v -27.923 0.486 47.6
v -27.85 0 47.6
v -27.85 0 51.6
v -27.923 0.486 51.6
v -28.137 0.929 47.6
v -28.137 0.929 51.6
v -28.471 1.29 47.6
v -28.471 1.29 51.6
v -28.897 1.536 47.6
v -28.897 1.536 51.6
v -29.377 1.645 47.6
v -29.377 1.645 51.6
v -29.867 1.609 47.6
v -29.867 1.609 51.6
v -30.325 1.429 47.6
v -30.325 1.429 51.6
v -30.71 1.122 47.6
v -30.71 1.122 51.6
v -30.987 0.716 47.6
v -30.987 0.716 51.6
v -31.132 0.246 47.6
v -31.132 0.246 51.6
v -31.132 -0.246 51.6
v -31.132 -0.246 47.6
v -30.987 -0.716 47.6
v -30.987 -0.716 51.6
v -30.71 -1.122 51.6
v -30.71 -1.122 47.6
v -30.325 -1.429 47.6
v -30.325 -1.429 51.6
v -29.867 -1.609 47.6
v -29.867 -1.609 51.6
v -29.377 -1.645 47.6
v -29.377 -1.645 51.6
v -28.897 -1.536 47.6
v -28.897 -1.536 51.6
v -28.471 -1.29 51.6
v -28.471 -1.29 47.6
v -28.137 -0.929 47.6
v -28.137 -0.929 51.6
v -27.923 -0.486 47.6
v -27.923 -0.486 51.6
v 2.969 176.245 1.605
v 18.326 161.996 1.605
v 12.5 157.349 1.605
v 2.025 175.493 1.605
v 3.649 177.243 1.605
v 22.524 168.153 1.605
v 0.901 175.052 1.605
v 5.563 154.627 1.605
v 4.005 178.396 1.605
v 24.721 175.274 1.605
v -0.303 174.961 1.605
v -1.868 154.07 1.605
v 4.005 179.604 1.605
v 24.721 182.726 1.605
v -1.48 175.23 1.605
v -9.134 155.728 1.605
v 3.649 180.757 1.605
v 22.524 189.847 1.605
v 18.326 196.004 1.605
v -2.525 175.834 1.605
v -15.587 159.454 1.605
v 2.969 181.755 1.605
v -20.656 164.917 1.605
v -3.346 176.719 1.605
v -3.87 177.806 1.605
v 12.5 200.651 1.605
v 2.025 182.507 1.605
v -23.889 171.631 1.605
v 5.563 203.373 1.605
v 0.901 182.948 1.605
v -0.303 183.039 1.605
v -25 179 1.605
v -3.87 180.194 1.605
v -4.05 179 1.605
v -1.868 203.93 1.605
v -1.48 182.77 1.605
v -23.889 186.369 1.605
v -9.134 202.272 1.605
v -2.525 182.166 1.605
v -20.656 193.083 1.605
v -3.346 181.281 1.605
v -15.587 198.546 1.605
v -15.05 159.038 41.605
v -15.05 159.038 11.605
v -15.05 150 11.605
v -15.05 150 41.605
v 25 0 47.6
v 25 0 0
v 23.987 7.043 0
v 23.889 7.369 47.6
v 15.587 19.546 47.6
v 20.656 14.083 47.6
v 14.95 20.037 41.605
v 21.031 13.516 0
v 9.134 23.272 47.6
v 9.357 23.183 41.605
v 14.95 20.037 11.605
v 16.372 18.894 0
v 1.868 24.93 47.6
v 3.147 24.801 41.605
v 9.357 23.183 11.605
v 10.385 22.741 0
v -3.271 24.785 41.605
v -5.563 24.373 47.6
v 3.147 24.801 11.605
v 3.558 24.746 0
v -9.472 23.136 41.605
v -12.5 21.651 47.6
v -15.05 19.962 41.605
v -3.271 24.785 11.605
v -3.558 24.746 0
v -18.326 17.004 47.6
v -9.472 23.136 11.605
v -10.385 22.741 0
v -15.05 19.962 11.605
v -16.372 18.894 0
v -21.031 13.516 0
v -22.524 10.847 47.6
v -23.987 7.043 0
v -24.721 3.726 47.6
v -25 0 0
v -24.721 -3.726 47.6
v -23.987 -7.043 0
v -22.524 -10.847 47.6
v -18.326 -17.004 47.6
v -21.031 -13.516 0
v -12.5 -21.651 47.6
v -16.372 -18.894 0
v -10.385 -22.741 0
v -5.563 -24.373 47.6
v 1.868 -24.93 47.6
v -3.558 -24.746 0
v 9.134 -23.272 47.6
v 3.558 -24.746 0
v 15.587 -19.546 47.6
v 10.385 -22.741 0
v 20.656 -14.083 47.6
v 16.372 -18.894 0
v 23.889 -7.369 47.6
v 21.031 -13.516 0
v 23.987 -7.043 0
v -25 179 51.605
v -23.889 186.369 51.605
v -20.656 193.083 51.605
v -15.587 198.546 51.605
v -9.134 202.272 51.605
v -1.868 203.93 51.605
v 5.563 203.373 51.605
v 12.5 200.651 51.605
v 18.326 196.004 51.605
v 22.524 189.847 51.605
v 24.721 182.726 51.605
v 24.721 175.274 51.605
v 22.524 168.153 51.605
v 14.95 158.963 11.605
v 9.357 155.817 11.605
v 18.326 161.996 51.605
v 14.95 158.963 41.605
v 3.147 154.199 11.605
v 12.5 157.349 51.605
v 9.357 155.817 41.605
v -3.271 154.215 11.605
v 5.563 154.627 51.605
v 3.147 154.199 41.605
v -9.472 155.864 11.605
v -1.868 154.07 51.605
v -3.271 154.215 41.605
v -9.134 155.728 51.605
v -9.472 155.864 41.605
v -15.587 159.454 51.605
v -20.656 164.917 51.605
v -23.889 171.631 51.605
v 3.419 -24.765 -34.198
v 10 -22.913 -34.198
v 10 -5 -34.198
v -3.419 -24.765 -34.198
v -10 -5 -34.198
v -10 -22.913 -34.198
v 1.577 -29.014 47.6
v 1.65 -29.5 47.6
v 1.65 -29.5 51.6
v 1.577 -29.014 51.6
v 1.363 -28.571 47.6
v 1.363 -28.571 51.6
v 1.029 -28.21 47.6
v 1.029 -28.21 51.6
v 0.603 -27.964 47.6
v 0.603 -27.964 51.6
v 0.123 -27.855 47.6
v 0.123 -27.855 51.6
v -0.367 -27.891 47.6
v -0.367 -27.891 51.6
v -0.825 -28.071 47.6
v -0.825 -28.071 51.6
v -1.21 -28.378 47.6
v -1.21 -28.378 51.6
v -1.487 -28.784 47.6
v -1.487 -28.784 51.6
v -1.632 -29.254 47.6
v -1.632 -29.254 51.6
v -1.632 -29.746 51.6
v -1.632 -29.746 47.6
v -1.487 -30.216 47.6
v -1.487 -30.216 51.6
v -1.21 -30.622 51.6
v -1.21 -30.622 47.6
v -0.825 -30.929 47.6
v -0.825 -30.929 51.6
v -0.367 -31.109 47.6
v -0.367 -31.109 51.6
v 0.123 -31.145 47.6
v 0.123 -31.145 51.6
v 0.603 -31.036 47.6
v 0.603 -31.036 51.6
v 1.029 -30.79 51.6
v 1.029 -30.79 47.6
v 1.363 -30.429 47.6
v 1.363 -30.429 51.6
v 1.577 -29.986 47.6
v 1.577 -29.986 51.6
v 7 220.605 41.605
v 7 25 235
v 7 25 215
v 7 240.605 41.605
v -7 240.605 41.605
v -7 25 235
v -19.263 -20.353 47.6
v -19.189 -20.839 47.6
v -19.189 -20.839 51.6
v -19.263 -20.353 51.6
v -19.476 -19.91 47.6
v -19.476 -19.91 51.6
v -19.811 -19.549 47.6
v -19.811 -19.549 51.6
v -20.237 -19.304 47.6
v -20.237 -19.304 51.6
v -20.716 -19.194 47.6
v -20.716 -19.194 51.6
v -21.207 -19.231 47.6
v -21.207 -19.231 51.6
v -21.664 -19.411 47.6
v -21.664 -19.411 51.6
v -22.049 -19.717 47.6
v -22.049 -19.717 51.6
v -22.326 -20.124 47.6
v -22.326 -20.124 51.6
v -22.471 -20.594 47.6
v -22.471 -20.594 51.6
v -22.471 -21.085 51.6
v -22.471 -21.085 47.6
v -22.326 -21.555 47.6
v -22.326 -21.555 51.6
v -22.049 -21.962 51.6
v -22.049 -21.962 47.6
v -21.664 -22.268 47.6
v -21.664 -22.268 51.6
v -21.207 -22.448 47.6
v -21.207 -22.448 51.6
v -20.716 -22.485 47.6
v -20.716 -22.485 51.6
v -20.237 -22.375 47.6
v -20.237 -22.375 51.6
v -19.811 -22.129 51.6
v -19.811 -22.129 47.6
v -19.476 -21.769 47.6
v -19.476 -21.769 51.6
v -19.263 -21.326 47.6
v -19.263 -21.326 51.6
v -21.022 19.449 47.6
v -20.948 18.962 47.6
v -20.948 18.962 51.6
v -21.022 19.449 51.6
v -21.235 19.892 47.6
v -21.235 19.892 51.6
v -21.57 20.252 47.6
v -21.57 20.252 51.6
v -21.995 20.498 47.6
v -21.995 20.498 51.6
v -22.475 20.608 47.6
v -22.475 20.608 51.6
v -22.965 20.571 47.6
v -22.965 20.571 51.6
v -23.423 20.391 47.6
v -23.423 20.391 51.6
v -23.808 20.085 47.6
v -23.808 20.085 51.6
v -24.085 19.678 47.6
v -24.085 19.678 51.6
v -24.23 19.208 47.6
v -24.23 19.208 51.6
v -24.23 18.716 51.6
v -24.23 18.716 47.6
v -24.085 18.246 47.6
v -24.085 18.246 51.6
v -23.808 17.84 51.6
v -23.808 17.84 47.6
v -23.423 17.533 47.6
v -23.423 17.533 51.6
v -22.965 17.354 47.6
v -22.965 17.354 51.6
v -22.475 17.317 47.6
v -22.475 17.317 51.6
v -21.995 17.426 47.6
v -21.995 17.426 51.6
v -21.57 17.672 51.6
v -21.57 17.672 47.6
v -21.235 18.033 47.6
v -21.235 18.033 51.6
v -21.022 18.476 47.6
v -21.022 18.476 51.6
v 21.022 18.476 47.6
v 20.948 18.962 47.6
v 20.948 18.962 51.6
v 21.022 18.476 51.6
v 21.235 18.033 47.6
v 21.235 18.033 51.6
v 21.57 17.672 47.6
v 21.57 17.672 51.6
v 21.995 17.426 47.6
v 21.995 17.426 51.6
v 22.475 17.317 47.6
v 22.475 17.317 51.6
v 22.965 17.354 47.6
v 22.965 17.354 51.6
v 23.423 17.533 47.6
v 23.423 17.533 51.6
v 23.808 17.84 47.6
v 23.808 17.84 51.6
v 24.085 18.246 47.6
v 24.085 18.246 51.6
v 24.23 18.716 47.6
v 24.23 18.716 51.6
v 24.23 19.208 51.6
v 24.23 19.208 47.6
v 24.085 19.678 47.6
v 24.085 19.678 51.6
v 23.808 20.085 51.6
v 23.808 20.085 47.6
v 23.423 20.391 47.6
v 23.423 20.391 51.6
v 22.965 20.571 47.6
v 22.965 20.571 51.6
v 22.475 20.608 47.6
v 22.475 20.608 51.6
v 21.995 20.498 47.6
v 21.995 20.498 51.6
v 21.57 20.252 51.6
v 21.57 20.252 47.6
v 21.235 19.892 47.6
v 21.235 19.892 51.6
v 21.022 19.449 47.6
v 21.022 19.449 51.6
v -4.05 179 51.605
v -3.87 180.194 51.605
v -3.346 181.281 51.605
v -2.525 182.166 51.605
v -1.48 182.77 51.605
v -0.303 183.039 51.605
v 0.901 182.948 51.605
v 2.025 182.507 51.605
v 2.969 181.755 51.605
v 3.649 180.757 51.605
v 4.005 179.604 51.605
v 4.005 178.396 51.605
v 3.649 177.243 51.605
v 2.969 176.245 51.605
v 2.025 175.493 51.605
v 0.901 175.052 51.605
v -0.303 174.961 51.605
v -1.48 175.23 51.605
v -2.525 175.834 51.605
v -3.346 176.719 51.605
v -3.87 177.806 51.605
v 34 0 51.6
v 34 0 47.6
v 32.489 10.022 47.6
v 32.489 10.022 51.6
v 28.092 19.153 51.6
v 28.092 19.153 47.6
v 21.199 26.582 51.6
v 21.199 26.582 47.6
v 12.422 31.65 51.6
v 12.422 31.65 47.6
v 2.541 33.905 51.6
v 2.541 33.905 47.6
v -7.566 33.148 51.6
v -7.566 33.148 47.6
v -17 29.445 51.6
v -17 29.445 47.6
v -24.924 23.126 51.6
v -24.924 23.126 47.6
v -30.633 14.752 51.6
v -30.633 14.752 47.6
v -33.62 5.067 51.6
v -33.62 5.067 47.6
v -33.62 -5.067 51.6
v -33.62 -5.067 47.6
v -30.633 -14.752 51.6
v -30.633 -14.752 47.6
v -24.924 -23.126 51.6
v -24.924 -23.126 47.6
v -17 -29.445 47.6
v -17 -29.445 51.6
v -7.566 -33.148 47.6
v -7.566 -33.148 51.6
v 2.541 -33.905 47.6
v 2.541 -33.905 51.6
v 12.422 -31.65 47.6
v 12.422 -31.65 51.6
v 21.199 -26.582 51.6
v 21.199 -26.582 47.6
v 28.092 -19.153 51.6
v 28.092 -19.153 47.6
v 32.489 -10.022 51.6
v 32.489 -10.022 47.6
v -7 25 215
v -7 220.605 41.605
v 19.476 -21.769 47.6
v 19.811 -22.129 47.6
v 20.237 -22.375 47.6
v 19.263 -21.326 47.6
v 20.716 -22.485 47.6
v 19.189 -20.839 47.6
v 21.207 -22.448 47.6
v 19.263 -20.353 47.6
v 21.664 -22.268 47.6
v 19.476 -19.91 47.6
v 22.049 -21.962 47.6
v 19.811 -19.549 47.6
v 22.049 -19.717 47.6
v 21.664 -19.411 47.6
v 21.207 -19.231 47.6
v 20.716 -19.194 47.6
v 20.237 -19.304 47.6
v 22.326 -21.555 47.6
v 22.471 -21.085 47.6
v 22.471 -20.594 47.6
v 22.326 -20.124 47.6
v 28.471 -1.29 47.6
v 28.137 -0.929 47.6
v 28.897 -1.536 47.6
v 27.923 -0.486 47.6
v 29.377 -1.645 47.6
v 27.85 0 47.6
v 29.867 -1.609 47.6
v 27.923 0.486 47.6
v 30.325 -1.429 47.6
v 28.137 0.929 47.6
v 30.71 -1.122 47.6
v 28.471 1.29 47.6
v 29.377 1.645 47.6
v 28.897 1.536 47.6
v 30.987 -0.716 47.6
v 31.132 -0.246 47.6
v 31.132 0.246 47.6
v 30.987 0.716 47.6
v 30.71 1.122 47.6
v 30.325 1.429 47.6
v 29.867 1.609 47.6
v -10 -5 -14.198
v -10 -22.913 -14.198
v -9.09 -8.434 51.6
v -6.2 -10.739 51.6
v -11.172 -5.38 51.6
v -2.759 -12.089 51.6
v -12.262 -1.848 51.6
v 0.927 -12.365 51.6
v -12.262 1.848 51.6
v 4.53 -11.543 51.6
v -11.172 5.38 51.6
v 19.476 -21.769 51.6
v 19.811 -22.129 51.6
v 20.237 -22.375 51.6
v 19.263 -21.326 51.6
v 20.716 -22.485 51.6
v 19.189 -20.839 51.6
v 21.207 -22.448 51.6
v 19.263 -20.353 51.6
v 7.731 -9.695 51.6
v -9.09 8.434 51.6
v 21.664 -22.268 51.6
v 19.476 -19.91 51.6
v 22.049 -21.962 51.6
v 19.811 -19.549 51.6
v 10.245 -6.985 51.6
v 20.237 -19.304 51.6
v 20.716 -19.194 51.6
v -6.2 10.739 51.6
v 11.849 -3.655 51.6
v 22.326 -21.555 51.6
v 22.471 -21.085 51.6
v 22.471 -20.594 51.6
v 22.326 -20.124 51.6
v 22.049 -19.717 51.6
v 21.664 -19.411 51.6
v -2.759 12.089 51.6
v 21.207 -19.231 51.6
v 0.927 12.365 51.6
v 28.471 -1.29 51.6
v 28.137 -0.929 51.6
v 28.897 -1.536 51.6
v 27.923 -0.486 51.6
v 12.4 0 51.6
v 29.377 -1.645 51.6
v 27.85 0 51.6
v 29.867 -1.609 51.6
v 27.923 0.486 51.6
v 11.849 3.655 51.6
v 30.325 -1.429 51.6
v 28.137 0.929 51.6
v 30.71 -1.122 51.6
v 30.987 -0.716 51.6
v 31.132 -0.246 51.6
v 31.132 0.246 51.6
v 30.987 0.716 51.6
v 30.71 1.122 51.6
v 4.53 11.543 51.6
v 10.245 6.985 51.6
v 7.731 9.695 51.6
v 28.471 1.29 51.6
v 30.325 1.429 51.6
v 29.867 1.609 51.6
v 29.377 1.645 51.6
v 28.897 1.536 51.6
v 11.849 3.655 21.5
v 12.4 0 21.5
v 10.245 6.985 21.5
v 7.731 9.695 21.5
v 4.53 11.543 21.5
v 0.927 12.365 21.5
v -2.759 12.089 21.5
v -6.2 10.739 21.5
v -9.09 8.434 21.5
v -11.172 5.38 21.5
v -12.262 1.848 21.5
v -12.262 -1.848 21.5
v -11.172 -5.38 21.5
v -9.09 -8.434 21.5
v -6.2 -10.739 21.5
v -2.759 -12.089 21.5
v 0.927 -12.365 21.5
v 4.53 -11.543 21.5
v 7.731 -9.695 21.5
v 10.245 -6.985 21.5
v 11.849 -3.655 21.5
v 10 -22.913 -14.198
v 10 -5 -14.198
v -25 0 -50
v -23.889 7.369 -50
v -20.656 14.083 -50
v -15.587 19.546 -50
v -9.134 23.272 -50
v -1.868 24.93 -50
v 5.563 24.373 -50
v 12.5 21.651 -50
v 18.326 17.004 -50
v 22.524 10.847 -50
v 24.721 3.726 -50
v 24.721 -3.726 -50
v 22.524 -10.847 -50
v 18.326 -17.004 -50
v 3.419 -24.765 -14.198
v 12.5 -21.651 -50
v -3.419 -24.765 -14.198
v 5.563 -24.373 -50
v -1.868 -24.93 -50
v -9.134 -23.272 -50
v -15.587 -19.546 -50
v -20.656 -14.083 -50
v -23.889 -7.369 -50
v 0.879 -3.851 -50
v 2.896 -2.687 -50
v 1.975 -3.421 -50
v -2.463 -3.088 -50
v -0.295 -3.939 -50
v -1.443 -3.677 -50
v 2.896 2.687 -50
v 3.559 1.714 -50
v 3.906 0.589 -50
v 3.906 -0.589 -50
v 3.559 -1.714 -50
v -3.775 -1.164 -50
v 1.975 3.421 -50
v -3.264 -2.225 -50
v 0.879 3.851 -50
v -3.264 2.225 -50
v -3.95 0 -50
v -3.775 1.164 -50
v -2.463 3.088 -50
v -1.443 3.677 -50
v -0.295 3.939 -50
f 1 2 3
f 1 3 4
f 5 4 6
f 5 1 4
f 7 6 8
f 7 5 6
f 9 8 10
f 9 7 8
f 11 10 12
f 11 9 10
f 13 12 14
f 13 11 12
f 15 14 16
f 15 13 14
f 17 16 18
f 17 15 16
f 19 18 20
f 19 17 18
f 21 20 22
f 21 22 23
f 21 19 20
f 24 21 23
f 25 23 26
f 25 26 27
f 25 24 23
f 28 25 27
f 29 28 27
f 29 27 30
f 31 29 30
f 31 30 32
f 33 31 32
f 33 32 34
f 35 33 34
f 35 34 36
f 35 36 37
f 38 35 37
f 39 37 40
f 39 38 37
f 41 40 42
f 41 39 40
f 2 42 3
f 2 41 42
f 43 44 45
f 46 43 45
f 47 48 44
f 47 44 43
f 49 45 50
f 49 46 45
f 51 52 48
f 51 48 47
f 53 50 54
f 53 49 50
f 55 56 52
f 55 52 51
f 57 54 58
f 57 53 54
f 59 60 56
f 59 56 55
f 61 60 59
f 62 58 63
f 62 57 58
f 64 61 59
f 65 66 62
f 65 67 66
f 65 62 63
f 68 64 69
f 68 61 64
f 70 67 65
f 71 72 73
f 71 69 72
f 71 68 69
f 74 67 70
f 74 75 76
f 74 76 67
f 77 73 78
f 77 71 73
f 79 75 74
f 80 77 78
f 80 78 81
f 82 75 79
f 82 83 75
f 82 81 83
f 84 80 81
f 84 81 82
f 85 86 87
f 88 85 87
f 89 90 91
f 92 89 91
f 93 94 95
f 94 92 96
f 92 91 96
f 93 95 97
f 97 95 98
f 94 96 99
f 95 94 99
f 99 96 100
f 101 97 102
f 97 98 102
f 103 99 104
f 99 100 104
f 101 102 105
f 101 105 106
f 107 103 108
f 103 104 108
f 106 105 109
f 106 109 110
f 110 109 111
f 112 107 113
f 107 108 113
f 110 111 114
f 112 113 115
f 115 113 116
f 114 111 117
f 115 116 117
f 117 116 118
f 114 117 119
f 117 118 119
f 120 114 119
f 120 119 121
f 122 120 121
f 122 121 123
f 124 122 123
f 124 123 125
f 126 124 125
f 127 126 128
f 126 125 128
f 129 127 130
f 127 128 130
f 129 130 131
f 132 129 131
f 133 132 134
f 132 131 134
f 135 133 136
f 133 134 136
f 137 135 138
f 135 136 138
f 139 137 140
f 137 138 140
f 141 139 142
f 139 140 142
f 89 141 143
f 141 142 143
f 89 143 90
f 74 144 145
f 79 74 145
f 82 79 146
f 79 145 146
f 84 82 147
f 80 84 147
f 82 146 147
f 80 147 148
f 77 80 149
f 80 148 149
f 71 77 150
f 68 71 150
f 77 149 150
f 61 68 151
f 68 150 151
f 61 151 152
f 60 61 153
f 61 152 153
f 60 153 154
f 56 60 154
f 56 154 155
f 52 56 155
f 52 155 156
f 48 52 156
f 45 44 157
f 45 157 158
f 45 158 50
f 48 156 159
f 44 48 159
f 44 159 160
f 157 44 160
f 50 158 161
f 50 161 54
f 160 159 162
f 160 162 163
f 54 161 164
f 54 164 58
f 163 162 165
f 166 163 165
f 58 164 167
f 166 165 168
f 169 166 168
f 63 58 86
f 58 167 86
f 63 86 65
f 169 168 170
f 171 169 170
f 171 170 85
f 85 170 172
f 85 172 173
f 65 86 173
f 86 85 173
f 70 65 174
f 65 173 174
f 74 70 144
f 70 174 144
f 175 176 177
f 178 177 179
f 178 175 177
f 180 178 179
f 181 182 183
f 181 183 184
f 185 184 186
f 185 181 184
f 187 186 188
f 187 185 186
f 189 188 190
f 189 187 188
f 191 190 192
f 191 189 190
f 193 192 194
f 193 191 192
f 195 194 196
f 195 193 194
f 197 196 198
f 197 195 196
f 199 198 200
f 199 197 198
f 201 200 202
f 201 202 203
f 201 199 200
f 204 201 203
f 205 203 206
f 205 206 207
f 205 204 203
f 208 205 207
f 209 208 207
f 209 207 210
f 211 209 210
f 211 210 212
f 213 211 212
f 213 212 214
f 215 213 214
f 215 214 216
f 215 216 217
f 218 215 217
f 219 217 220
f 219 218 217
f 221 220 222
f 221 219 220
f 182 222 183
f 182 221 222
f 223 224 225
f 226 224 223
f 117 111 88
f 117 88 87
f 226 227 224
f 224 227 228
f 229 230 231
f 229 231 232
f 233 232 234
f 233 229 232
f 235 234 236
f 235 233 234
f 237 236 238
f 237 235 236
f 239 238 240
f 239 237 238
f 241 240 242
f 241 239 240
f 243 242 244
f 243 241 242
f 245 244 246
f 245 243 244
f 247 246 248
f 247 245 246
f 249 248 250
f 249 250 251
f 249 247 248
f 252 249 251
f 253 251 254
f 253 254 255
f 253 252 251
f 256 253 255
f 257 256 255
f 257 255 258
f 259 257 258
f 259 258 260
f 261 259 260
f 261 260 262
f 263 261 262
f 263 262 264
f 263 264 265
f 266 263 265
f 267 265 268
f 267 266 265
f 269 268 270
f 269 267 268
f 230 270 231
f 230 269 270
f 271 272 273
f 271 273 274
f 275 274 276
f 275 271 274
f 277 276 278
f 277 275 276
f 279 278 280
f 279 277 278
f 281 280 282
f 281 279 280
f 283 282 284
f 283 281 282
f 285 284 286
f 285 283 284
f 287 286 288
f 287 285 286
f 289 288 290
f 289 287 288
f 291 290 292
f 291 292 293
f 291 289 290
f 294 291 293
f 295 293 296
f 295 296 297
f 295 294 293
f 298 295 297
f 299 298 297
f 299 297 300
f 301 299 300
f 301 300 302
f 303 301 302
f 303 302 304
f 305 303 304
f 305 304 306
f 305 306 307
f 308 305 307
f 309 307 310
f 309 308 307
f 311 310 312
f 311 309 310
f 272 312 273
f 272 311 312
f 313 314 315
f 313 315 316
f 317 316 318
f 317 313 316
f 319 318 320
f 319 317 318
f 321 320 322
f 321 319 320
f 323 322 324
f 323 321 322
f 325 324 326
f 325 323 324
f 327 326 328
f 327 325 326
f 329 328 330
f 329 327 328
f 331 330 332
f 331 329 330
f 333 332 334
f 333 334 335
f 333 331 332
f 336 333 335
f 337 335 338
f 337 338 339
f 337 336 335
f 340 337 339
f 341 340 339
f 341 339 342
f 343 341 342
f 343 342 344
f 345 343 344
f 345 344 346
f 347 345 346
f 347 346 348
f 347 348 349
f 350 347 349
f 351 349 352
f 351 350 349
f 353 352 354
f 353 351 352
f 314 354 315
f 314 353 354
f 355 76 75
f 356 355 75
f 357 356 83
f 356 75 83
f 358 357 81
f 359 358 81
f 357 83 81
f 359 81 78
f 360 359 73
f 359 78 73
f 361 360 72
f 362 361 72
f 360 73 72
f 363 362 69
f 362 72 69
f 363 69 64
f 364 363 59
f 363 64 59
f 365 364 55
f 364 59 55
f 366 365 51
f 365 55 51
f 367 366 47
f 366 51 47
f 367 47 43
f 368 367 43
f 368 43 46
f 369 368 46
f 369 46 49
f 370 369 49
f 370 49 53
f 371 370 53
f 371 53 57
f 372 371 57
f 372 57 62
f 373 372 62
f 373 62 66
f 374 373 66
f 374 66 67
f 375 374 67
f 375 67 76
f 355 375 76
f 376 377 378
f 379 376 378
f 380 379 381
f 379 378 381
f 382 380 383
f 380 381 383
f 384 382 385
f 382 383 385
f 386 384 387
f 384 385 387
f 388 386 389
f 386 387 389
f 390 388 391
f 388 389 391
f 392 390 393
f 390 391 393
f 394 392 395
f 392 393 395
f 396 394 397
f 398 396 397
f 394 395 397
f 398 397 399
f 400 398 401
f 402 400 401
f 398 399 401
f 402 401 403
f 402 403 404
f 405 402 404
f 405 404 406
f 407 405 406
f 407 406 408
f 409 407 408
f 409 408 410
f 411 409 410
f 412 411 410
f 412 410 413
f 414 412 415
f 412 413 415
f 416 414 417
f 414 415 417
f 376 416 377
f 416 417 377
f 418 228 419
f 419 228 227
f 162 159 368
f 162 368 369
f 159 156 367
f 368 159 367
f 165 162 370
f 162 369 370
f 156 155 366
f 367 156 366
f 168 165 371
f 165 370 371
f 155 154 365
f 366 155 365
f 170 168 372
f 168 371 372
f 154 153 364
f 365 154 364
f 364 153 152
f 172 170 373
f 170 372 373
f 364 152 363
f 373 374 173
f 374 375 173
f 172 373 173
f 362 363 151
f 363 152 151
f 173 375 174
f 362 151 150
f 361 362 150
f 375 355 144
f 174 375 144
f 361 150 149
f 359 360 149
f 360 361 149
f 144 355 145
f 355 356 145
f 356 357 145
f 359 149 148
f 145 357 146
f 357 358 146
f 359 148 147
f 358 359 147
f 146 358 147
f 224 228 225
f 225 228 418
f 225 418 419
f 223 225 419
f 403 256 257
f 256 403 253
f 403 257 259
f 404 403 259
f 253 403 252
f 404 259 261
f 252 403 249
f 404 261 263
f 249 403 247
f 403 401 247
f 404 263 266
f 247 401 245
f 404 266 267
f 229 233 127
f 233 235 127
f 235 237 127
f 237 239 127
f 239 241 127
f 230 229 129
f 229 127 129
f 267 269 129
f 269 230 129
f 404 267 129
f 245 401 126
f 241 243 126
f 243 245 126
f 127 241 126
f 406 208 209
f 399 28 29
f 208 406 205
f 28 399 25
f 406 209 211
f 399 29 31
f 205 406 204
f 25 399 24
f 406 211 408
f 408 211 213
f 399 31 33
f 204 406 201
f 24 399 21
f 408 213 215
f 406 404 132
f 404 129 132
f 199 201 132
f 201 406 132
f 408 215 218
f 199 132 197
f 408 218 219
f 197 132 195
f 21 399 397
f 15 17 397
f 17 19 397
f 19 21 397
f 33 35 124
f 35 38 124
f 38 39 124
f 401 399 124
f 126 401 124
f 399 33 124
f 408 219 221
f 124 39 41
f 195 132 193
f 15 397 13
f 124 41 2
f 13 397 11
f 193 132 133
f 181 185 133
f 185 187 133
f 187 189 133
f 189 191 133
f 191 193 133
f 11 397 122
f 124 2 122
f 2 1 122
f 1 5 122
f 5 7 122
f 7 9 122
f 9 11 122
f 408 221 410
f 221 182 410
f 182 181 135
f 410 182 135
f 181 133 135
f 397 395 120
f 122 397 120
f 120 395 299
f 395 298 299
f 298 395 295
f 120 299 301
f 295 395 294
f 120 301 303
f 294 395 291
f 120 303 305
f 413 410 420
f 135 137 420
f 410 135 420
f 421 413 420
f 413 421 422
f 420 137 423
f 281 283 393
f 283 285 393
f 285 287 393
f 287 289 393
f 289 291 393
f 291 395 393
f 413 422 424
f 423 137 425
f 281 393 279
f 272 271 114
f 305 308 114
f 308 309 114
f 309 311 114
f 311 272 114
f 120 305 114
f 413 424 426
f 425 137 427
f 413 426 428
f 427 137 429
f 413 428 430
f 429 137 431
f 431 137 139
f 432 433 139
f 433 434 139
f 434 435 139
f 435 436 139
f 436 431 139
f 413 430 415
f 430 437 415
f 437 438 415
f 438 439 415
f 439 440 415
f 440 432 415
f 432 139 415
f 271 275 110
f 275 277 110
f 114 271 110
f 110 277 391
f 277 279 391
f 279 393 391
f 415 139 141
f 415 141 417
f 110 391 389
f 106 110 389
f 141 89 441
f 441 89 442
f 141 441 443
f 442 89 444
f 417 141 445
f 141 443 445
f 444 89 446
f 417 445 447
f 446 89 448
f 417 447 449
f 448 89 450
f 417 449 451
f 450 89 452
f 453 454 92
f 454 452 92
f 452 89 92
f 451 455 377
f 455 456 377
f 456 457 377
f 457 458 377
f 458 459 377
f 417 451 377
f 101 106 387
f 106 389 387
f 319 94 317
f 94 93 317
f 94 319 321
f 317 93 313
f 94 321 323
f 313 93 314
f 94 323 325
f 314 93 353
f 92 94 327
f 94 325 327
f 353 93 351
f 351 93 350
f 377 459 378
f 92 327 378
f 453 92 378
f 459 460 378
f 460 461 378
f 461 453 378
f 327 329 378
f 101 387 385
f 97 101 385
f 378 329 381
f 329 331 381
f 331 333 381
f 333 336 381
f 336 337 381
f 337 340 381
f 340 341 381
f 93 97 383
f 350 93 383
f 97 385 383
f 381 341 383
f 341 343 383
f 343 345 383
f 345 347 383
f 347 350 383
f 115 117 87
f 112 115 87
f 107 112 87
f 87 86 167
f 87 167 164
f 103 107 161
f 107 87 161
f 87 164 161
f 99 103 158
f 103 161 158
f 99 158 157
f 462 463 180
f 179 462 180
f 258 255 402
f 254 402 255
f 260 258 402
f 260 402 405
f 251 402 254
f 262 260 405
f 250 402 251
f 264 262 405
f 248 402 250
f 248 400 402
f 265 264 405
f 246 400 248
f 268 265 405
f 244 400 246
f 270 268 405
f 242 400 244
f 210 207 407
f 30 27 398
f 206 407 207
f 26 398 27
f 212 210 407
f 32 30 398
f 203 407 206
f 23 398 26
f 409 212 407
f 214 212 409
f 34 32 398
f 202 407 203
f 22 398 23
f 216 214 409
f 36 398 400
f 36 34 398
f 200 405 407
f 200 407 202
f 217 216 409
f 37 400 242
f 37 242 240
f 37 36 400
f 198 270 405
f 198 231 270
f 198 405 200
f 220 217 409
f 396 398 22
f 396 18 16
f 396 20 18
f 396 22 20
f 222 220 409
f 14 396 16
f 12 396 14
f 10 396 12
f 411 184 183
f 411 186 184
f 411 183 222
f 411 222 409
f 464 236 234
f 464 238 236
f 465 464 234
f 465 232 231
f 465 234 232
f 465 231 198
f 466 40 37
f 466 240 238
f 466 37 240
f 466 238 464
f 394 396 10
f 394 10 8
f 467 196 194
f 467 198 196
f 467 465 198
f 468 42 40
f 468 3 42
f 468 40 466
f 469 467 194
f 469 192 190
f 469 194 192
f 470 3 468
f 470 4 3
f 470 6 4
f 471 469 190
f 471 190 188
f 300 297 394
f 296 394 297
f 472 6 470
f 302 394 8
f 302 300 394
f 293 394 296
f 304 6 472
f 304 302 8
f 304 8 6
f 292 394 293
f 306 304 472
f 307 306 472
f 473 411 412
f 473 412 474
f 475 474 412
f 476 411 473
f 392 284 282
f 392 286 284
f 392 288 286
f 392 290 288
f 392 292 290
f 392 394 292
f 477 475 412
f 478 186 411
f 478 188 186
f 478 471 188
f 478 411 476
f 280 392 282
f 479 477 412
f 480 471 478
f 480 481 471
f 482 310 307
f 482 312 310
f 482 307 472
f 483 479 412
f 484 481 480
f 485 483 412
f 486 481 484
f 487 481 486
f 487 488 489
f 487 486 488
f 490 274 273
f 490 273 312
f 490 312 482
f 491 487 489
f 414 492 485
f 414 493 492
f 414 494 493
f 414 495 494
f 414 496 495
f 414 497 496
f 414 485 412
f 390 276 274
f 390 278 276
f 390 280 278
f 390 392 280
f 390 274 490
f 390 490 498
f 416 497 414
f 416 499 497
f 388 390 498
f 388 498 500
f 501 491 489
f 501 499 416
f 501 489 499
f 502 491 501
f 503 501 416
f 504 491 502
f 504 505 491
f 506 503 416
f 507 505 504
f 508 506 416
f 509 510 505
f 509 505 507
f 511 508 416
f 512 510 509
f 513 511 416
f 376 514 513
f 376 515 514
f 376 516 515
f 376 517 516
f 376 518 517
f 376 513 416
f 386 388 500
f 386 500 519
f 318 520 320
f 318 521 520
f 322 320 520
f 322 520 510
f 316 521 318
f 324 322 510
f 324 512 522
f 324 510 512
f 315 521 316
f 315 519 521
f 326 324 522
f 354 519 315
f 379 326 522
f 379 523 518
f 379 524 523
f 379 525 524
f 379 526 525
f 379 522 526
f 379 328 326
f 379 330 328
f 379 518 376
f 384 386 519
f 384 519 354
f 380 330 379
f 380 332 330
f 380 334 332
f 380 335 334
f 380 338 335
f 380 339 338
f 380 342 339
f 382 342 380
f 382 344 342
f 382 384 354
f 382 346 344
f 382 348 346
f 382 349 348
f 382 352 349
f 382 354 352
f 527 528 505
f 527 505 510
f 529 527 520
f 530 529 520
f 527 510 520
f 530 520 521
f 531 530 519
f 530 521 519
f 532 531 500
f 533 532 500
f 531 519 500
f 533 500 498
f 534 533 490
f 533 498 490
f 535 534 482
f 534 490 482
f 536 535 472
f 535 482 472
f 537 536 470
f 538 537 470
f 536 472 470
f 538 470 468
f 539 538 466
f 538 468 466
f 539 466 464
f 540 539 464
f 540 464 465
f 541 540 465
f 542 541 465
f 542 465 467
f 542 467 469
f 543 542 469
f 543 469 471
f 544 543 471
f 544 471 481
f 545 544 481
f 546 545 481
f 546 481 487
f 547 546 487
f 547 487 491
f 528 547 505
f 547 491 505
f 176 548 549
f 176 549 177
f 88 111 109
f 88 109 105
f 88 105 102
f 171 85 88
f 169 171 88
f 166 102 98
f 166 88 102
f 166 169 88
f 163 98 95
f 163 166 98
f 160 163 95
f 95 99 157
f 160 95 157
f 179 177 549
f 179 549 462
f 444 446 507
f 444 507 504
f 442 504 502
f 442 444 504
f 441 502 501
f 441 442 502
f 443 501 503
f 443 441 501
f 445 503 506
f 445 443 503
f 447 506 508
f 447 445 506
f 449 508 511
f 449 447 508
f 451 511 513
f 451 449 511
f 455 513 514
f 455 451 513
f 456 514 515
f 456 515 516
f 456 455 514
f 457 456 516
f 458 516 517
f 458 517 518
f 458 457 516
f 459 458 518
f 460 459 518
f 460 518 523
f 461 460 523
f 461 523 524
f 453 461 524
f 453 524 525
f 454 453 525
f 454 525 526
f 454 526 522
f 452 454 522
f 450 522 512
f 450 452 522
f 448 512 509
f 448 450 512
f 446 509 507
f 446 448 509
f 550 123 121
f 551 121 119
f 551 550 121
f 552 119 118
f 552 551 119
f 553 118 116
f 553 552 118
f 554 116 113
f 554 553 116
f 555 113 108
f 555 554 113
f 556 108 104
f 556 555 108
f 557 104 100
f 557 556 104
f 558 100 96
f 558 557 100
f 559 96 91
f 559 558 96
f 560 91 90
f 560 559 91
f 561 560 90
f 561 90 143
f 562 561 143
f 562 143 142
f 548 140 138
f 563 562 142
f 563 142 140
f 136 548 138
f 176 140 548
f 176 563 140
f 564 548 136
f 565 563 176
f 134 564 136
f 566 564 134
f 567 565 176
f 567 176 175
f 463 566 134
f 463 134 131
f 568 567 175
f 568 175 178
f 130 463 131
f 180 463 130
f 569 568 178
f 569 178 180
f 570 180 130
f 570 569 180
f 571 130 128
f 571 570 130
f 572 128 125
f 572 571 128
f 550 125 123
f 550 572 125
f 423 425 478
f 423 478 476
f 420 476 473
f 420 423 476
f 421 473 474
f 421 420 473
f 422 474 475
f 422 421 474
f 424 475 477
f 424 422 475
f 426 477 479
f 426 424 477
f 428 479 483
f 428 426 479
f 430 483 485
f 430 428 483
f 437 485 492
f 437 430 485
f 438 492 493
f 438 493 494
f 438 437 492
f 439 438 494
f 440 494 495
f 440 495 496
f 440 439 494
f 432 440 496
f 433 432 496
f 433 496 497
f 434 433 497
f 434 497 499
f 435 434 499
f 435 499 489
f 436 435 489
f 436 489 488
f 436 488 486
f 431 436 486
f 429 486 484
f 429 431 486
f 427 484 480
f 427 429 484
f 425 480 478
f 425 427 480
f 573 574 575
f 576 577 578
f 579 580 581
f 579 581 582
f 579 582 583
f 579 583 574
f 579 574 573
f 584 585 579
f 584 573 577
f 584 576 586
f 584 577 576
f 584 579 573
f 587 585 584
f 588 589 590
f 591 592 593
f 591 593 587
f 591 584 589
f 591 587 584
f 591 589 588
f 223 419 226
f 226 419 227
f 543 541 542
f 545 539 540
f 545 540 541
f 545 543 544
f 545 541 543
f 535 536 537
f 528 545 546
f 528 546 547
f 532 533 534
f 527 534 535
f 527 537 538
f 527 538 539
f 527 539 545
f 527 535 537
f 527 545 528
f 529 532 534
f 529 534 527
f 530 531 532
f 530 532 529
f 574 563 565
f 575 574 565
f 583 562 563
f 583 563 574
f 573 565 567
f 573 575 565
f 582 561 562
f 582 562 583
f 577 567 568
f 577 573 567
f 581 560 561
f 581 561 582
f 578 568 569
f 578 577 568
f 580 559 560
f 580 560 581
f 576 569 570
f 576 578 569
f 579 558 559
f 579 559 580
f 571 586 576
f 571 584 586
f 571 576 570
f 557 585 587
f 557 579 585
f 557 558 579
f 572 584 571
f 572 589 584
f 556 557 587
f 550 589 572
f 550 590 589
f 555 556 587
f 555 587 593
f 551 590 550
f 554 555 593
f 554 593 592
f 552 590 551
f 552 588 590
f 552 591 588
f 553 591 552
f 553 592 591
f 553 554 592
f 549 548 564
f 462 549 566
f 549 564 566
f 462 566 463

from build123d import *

# Parameters (mm, degrees)
CROQUIS1_R                    = 25
SALIENTE_EXTRUIR1_DEPTH       = 270
CROQUIS2_W                    = 30
CROQUIS2_H                    = 30
SALIENTE_EXTRUIR13_DEPTH      = 150
SALIENTE_EXTRUIR14_DEPTH      = 10
SALIENTE_EXTRUIR14_DEPTH_BACK = 40
CROQUIS14_R                   = 25
SALIENTE_EXTRUIR15_DEPTH      = 7
SALIENTE_EXTRUIR15_DEPTH_BACK = 7
SALIENTE_EXTRUIR16_START      = 50
CROQUIS17_R                   = 25
SALIENTE_EXTRUIR16_DEPTH      = 50
CROQUIS20_R                   = 3.95
SALIENTE_EXTRUIR18_DEPTH      = 6
CROQUIS21_R                   = 2.05
CORTAR_EXTRUIR2_DEPTH         = 10
CROQUIS22_W                   = 20
CROQUIS22_H                   = 20
CORTAR_EXTRUIR3_DEPTH         = 20
SALIENTE_EXTRUIR19_DEPTH      = 30
CROQUIS28_R                   = 26.403024508
CORTAR_EXTRUIR4_DEPTH         = 218.4
CROQUIS29_R                   = 34.264555867
CORTAR_EXTRUIR5_DEPTH         = 218.4
CROQUIS30_R                   = 12.4
CORTAR_EXTRUIR6_DEPTH         = 30.1
CROQUIS31_R                   = 4.05
CORTAR_EXTRUIR7_DEPTH         = 60
SALIENTE_EXTRUIR20_START      = -4
CROQUIS32_R                   = 34
CROQUIS32_R_2                 = 25
CROQUIS32_R_3                 = 1.65
SALIENTE_EXTRUIR20_DEPTH      = 4


with BuildPart() as part:
    # Croquis1 → Saliente-Extruir1 (new body)
    with BuildSketch(Plane.XY):
        Circle(CROQUIS1_R)
    extrude(amount=SALIENTE_EXTRUIR1_DEPTH)

    # Croquis2 → Saliente-Extruir13 (add)
    with BuildSketch(Plane(origin=(0, 0, 0), x_dir=(1, 0, 0), z_dir=(0, 1, 0))):
        with Locations((-0.05, -26.604607898)):
            Rectangle(CROQUIS2_W, CROQUIS2_H)
    extrude(amount=SALIENTE_EXTRUIR13_DEPTH)

    # Croquis17 → Saliente-Extruir16 (add)
    with BuildSketch(Plane(origin=(0, 0, 0), x_dir=(-1, 0, 0), z_dir=(0, 0, -1)).offset(SALIENTE_EXTRUIR16_START)):
        Circle(CROQUIS17_R)
    extrude(amount=-SALIENTE_EXTRUIR16_DEPTH)

    # Croquis20 → Saliente-Extruir18 (add)
    with BuildSketch(Plane(origin=(0, 0, -50), x_dir=(-1, 0, 0), z_dir=(0, 0, -1))):
        Circle(CROQUIS20_R)
    extrude(amount=SALIENTE_EXTRUIR18_DEPTH)

    # Croquis21 → Cortar-Extruir2 (cut)
    with BuildSketch(Plane.XY.offset(270)):
        Circle(CROQUIS21_R)
    extrude(amount=-CORTAR_EXTRUIR2_DEPTH, mode=Mode.SUBTRACT)

    # Croquis22 → Cortar-Extruir3 (cut)
    with BuildSketch(Plane(origin=(0, -25, 0), x_dir=(-1, 0, 0), z_dir=(0, -1, 0))):
        with Locations((0, 24.197696051)):
            Rectangle(CROQUIS22_W, CROQUIS22_H)
    extrude(amount=-CORTAR_EXTRUIR3_DEPTH, mode=Mode.SUBTRACT)



with BuildPart() as body_2:
    # Croquis14 → Saliente-Extruir14 (new, two sides: drawn at the far end of the back side and taken through both)
    with BuildSketch(Plane(origin=(0, 0, 11.604607898), x_dir=(-1, 0, 0), z_dir=(0, 0, -1)).offset(-SALIENTE_EXTRUIR14_DEPTH_BACK)):
        with Locations((0, 179)):
            Circle(CROQUIS14_R)
    extrude(amount=SALIENTE_EXTRUIR14_DEPTH + SALIENTE_EXTRUIR14_DEPTH_BACK)


with BuildPart() as body_3:
    # Croquis15 → Saliente-Extruir15 (new, two sides: drawn at the far end of the back side and taken through both)
    with BuildSketch(Plane(origin=(0, 0, 0), x_dir=(0, 0, -1), z_dir=(1, 0, 0)).offset(-SALIENTE_EXTRUIR15_DEPTH_BACK)):
        Polygon((-41.604607898, 240.604607898), (-235, 25), (-215, 25), (-41.604607898, 220.604607898), align=None)
    extrude(amount=SALIENTE_EXTRUIR15_DEPTH + SALIENTE_EXTRUIR15_DEPTH_BACK)


with BuildPart() as part_1:
    add(part.part)

    add(body_2.part)  # Saliente-Extruir19 merges body 2
    # Croquis27 → Saliente-Extruir19 (add)
    with BuildSketch(Plane(origin=(0, 0, 11.604607898), x_dir=(-1, 0, 0), z_dir=(0, 0, -1))):
        with BuildLine():
            Line((-14.95, 150), (-14.95, 158.962597474))
            ThreePointArc((-14.95, 158.962597474), (0.06250011, 154.000078125), (15.05, 159.03759784))
            Line((15.05, 159.03759784), (15.05, 150))
            Line((15.05, 150), (-14.95, 150))
        make_face()
    extrude(amount=-SALIENTE_EXTRUIR19_DEPTH)

    # Croquis28 → Cortar-Extruir4 (cut)
    with BuildSketch(Plane.XY.offset(270)):
        Circle(CROQUIS28_R)
    extrude(amount=-CORTAR_EXTRUIR4_DEPTH, mode=Mode.SUBTRACT)

    # Croquis29 → Cortar-Extruir5 (cut)
    with BuildSketch(Plane(origin=(0, 0, -50), x_dir=(-1, 0, 0), z_dir=(0, 0, -1))):
        Circle(CROQUIS29_R)
    extrude(amount=CORTAR_EXTRUIR5_DEPTH, mode=Mode.SUBTRACT)

    # Croquis30 → Cortar-Extruir6 (cut)
    with BuildSketch(Plane.XY.offset(51.6)):
        Circle(CROQUIS30_R)
    extrude(amount=-CORTAR_EXTRUIR6_DEPTH, mode=Mode.SUBTRACT)

    # Croquis31 → Cortar-Extruir7 (cut)
    with BuildSketch(Plane(origin=(0, 0, 1.604607898), x_dir=(-1, 0, 0), z_dir=(0, 0, -1))):
        with Locations((0, 179)):
            Circle(CROQUIS31_R)
    extrude(amount=-CORTAR_EXTRUIR7_DEPTH, mode=Mode.SUBTRACT)

    # Croquis32 → Saliente-Extruir20 (add)
    with BuildSketch(Plane.XY.offset(51.6).offset(SALIENTE_EXTRUIR20_START)):
        Circle(CROQUIS32_R)
        with Locations(Location((0, 0, 0), (0, 0, 180))):
            Circle(CROQUIS32_R_2, mode=Mode.SUBTRACT)
        with Locations((-22.598311072, 18.962234486)):
            Circle(CROQUIS32_R_3, mode=Mode.SUBTRACT)
        with Locations((-29.5, 0)):
            Circle(CROQUIS32_R_3, mode=Mode.SUBTRACT)
        with Locations((-20.839445312, -20.839445312)):
            Circle(CROQUIS32_R_3, mode=Mode.SUBTRACT)
        with Locations((0, -29.5)):
            Circle(CROQUIS32_R_3, mode=Mode.SUBTRACT)
        with Locations(Location((20.839445312, -20.839445312, 0), (0, 0, 180))):
            Circle(CROQUIS32_R_3, mode=Mode.SUBTRACT)
        with Locations(Location((29.5, 0, 0), (0, 0, 180))):
            Circle(CROQUIS32_R_3, mode=Mode.SUBTRACT)
        with Locations(Location((22.598311072, 18.962234486, 0), (0, 0, 180))):
            Circle(CROQUIS32_R_3, mode=Mode.SUBTRACT)
    extrude(amount=SALIENTE_EXTRUIR20_DEPTH)


solid = Compound([body_3.part, part_1.part])
